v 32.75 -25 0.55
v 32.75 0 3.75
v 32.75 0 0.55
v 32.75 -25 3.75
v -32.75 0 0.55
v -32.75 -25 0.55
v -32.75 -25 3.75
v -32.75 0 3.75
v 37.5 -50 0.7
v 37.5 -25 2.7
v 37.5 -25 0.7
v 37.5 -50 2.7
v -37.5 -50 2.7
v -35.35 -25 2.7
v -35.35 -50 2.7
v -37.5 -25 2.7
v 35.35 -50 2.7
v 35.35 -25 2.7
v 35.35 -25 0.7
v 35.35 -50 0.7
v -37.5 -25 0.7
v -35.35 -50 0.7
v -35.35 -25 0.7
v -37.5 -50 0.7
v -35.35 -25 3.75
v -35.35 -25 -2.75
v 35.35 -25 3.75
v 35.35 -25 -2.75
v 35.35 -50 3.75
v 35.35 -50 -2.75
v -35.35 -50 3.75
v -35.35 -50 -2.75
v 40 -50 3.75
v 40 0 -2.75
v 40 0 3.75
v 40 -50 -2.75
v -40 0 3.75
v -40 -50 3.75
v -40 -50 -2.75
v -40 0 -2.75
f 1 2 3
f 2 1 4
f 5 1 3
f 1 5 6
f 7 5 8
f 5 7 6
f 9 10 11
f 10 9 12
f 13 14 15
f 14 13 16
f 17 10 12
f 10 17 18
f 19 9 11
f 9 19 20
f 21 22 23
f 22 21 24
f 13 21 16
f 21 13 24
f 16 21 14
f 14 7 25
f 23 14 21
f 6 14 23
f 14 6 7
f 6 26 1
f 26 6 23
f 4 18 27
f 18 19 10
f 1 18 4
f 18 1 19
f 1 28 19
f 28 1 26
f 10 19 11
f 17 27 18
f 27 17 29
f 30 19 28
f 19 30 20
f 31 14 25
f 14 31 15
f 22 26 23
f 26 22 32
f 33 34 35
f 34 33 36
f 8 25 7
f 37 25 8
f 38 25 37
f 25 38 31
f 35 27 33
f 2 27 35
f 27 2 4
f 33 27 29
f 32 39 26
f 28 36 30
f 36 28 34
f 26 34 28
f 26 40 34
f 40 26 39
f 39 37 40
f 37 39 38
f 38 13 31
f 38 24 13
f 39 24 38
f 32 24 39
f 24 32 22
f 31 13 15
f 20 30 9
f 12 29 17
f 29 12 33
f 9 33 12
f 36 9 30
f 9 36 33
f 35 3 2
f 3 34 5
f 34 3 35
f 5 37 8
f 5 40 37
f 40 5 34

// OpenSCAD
// Case for PCB

case_th = 13/2;
pcb_th = 4;

module PCB()
{
  cube([65.5, 70.2, pcb_th], center = true);
  translate([-65.5/2-15/2+15+20, -70.2/2-2/2+0.1, 0])
    cube([15, 2, pcb_th], center=true);
}


module case()
{
    cube([80, 100, case_th], center=true);
}

module calculator()
{
    cube([75.0, 50.0, 2.0], center=true);
    cube([70.7, 50, 9.5], center=true);
}

module case2 ()
{
difference()
{
  translate([0, 0, 0.5])
  case();
  translate([0,0+10, case_th/2-1.6/2+0.1])
    PCB();
    translate([0, -50, 9.5/2+5/2-9.5/2-1.6/2])
    calculator();
}
}

difference()
{
case2();
    translate([0, 50,0])
    cube([100,100,100], center=true);
}
